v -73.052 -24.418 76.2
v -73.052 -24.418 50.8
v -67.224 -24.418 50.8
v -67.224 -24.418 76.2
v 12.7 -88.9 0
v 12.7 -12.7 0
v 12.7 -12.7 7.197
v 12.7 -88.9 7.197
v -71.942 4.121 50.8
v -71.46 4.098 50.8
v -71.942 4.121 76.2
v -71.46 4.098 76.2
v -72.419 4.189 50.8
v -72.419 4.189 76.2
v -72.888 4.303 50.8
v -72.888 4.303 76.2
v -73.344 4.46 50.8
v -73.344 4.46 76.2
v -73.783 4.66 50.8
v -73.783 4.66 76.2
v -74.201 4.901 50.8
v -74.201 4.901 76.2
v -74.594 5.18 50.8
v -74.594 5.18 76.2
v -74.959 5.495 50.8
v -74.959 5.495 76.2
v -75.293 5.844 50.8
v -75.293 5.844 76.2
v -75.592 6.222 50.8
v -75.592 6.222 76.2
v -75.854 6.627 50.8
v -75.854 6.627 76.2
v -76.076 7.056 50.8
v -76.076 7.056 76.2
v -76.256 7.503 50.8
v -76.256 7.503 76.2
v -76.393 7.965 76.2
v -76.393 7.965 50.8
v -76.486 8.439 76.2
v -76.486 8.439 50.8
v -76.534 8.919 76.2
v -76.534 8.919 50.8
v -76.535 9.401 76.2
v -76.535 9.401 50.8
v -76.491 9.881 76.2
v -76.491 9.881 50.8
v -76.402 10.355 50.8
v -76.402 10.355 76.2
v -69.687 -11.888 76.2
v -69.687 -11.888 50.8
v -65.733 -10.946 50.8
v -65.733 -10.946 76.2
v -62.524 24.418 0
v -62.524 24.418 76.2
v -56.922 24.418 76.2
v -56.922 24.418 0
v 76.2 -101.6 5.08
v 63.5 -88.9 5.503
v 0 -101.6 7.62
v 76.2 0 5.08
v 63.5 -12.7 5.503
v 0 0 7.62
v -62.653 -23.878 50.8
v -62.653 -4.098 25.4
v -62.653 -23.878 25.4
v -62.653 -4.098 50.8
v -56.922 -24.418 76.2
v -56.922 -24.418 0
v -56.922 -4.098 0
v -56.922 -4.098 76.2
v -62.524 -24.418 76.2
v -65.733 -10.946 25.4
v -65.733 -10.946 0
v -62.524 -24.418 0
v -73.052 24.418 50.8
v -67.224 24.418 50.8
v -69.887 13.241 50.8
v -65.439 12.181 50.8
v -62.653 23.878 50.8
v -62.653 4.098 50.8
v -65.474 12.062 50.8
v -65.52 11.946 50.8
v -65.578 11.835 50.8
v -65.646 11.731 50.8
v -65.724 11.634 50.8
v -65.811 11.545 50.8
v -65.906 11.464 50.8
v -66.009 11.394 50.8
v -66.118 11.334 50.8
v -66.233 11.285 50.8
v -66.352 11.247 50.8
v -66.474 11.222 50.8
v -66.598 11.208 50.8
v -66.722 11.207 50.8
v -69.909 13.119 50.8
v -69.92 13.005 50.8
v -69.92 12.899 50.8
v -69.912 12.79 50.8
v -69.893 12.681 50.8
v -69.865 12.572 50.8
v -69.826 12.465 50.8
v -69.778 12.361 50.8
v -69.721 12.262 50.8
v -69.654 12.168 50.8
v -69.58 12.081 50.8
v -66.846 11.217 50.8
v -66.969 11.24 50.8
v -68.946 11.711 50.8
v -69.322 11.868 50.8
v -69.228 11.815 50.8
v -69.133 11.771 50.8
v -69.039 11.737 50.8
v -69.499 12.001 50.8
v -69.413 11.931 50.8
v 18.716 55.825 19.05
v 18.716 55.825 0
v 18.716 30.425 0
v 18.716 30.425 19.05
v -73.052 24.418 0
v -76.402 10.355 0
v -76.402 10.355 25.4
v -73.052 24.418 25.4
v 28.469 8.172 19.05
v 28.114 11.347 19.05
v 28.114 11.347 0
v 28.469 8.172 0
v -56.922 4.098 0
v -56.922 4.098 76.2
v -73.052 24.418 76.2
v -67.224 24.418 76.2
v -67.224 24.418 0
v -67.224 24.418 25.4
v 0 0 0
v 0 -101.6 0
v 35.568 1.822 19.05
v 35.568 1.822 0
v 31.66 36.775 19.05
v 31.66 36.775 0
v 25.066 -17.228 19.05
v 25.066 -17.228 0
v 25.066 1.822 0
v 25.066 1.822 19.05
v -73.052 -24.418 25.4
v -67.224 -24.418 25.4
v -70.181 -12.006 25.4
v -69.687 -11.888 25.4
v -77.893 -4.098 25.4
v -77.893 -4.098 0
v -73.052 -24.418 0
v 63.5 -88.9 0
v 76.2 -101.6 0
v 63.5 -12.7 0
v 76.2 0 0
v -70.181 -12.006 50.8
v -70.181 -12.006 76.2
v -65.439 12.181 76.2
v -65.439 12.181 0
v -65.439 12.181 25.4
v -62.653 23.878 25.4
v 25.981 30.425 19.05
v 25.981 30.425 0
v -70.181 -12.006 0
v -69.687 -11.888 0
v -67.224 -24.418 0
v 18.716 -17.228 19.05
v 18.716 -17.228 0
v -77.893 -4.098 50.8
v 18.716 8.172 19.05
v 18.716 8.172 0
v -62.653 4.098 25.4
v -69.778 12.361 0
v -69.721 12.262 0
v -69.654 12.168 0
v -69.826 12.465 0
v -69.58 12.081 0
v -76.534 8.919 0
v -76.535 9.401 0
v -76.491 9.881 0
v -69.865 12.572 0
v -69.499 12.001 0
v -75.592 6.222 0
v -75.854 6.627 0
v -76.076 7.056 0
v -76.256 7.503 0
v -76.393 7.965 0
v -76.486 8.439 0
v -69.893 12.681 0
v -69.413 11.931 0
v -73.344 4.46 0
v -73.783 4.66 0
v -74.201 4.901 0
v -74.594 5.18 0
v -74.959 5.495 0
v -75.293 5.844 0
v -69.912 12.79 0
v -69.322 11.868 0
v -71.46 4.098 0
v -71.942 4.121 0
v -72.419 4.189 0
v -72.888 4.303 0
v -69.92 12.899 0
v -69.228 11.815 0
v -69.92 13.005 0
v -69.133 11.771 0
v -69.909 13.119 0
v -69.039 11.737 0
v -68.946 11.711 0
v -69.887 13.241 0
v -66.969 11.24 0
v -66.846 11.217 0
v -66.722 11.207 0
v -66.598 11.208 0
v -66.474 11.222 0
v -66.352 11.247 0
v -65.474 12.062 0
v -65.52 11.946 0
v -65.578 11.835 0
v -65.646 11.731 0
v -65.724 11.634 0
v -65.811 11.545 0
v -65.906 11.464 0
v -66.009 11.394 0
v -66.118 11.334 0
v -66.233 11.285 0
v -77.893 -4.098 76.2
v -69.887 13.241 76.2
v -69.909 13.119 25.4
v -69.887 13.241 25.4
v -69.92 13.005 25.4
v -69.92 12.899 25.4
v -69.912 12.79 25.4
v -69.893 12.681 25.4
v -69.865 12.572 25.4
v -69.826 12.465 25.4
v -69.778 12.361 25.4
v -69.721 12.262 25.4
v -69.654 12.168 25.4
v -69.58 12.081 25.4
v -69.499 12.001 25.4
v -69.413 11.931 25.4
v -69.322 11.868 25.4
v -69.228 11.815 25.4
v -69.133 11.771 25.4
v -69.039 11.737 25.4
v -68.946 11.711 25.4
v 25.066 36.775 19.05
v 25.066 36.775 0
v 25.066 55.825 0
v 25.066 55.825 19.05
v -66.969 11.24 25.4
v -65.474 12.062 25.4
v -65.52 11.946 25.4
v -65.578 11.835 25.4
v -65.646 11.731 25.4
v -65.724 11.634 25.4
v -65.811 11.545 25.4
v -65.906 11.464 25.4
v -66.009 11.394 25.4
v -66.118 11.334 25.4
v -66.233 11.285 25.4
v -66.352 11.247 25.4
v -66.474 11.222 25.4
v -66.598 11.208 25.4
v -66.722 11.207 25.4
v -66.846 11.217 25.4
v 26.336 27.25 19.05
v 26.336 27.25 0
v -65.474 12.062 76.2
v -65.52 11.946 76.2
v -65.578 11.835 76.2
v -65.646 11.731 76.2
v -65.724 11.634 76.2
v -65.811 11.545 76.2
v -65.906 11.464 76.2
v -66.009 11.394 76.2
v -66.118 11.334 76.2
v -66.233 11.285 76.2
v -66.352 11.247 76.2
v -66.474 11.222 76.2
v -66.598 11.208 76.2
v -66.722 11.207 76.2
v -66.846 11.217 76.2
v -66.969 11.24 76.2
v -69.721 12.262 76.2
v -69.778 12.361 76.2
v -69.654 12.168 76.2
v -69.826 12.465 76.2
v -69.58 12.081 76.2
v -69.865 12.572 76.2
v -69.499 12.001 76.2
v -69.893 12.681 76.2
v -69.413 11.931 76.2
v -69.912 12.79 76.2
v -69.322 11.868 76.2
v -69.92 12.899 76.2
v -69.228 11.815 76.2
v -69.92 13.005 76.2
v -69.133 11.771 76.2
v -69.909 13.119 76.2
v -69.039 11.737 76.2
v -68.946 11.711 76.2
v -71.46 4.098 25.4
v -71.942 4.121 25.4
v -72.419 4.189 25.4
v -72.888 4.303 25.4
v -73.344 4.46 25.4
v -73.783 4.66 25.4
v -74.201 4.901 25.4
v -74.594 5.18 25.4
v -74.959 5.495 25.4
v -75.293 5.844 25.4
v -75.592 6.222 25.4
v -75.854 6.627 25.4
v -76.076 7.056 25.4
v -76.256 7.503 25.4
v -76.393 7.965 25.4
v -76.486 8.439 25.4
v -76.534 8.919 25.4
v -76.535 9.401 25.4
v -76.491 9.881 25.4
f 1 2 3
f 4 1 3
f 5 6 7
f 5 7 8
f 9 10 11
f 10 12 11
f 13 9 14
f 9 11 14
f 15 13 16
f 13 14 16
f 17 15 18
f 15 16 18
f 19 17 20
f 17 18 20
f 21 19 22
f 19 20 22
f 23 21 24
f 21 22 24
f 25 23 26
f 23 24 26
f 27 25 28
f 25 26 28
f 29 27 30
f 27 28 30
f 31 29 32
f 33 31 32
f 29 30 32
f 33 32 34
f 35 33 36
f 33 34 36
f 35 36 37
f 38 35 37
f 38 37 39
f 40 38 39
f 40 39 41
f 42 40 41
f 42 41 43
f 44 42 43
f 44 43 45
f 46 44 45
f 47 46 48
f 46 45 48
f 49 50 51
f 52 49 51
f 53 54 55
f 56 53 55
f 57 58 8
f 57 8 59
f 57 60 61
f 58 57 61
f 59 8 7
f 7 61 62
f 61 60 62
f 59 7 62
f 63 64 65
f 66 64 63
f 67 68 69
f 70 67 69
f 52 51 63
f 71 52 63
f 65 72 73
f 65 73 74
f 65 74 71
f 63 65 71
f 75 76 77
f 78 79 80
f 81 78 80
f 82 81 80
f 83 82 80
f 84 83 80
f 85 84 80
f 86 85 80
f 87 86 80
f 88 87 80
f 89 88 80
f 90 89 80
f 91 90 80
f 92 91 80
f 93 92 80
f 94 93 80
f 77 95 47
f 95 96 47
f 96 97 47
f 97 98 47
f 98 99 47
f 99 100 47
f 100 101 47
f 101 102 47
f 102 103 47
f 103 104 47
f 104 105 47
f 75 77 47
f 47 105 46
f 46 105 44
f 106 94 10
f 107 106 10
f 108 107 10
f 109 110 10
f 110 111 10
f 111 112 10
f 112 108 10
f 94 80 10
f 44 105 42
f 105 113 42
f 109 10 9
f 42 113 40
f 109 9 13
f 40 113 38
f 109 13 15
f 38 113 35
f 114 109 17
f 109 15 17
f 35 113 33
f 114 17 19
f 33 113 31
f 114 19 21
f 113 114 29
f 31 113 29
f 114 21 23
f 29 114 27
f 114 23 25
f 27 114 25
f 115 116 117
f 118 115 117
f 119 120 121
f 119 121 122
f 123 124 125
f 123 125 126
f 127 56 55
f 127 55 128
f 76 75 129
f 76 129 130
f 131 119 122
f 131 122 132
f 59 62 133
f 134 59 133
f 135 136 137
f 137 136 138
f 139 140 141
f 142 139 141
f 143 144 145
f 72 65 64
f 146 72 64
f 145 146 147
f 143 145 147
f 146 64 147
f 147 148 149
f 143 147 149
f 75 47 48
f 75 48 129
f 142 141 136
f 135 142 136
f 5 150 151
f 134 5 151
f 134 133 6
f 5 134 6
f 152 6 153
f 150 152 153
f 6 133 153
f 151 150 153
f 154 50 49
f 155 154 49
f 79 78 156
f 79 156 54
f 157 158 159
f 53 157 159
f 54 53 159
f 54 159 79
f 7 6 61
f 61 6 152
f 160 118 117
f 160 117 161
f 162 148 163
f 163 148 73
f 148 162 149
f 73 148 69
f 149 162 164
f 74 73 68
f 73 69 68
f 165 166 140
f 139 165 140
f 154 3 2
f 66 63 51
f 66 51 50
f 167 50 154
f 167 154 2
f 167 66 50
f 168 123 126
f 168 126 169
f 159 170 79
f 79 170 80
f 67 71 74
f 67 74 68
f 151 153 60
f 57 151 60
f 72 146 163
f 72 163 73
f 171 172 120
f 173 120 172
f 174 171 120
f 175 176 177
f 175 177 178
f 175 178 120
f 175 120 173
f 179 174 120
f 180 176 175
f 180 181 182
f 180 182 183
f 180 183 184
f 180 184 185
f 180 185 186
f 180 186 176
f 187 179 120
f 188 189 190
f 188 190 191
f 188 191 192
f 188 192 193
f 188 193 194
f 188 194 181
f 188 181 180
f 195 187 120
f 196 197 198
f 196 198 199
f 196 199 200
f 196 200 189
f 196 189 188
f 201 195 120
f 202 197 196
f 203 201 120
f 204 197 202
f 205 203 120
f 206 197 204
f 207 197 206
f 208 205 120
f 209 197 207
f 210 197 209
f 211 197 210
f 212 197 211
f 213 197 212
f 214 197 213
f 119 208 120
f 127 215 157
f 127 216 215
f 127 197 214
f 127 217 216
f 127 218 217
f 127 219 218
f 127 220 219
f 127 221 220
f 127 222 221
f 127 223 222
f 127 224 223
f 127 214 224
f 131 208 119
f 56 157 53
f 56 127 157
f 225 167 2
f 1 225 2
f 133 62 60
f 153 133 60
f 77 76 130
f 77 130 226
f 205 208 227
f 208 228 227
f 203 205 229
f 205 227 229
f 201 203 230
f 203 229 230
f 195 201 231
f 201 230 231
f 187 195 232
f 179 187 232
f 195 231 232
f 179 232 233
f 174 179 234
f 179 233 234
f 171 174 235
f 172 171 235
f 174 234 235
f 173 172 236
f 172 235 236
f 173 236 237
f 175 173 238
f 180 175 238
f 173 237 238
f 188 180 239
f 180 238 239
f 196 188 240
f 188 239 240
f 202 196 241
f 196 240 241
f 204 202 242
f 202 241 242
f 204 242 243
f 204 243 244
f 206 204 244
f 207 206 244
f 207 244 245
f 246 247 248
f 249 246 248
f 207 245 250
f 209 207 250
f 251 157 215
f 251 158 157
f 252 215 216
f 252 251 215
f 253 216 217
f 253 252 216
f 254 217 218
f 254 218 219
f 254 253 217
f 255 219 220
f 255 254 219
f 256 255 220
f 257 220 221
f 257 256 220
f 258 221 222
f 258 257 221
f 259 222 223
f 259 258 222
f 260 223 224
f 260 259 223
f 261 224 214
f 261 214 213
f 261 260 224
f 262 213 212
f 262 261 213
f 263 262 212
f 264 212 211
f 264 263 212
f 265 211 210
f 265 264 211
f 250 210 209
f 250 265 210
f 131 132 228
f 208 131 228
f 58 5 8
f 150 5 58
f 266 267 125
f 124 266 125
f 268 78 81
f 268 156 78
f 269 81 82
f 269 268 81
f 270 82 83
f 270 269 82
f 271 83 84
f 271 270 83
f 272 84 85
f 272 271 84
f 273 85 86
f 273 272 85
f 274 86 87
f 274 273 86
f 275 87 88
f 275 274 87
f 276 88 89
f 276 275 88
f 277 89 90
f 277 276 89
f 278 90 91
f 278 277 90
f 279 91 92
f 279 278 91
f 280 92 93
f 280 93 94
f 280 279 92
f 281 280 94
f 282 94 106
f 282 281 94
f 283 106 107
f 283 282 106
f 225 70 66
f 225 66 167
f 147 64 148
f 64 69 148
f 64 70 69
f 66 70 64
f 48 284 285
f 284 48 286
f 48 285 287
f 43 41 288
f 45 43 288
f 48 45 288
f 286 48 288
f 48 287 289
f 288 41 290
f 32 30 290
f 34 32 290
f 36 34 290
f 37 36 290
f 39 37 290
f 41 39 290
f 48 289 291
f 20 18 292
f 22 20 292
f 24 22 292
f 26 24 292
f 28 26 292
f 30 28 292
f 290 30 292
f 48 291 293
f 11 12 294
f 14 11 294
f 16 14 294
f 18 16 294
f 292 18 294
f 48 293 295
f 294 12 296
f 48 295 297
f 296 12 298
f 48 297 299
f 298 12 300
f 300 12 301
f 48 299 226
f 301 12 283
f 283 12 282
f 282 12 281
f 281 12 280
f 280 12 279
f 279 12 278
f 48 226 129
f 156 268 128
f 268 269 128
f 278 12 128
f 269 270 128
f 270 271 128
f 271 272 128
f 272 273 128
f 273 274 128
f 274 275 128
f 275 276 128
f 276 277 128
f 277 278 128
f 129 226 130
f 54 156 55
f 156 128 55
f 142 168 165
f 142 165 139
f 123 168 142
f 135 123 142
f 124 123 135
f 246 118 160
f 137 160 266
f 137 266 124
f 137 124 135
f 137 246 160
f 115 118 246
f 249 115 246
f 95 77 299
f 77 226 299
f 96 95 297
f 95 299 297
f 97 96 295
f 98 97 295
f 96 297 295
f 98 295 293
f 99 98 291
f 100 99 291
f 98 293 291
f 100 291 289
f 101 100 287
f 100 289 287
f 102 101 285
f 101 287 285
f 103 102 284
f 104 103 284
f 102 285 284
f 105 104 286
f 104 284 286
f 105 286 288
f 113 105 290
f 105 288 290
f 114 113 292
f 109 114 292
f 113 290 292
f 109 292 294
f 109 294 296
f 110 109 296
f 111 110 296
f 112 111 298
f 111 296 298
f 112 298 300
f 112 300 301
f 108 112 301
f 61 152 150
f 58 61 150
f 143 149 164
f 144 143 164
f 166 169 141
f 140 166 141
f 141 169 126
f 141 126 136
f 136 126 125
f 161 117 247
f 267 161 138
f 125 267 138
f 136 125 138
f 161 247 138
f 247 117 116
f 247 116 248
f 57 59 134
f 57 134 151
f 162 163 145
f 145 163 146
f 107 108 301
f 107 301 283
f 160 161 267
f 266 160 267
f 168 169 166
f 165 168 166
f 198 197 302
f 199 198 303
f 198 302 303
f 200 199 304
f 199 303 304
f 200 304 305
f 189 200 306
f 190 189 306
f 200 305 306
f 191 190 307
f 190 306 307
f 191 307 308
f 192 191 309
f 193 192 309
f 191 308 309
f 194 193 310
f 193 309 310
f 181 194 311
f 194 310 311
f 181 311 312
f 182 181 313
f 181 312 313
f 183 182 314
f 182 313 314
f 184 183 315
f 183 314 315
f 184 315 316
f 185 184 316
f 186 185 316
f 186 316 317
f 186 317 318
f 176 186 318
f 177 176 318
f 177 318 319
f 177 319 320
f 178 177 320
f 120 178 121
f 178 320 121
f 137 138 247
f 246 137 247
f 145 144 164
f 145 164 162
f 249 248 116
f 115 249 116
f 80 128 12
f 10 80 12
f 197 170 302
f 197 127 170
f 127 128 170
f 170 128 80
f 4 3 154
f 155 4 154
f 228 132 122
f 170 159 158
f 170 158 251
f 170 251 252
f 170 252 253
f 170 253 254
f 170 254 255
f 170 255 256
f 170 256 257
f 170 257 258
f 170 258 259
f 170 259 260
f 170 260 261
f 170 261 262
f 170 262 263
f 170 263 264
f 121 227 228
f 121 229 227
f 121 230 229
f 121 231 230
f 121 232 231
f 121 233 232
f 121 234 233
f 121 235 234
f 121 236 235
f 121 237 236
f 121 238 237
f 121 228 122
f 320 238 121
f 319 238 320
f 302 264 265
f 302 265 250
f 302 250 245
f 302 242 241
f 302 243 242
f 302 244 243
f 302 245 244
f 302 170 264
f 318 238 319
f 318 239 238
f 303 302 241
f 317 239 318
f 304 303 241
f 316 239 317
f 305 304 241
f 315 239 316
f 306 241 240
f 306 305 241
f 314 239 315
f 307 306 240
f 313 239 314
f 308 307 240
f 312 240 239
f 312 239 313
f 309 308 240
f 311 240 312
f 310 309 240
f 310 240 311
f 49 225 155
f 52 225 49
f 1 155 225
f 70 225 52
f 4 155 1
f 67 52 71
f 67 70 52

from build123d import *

# Parameters (mm, degrees)
F1_DEPTH  = 101.6
F2_W      = 50.8
F2_H      = 76.2
F3_DEPTH  = 7.621
F5_DEPTH  = 19.05
F7_DEPTH  = 76.2
F9_DEPTH  = 0.508
F10_DEPTH = 0.508
F12_DEPTH = 76.201
F8_W      = 15.24
F8_H      = 25.4
F13_DEPTH = 97.503062818
F15_R     = 5.08
F16_R     = 1.27


with BuildPart() as f1:
    # F0 (on Front) → F1 (new body)
    with BuildSketch(Plane.XZ):
        Polygon((0, 7.62), (0, 0), (76.2, 0), (76.2, 5.08), align=None)
    extrude(amount=F1_DEPTH)

    # F2 (on face) → F3 (cut, through all)
    with BuildSketch(Plane(origin=(0, 0, 0), x_dir=(1, 0, 0), z_dir=(0, 0, -1))):
        with Locations((38.1, 50.8)):
            Rectangle(F2_W, F2_H)
    extrude(amount=-F3_DEPTH, mode=Mode.SUBTRACT)


with BuildPart() as f5:
    # F4 (on Top) → F5 (new body)
    with BuildSketch(Plane.XY):
        Polygon((25.0658135089, 55.8246009568), (18.7158135089, 55.8246009568), (18.7158135089, 30.4246009568), (25.9808377175, 30.4246009568), (26.3358135089, 27.2496009568), (28.1138135089, 11.3466855008), (28.4687893003, 8.1716855008), (18.7158135089, 8.1716855008), (18.7158135089, -17.2283144992), (25.0658135089, -17.2283144992), (25.0658135089, 1.8216855008), (35.5683051289, 1.8216855008), (31.6604503803, 36.7746009568), (25.0658135089, 36.7746009568), align=None)
    extrude(amount=F5_DEPTH)


with BuildPart() as f7:
    # F6 (on Top) → F7 (new body)
    with BuildSketch(Plane.XY):
        Polygon((-62.001723196, -24.417937182), (-56.921723196, -24.417937182), (-56.921723196, -4.097937182), (-77.8925820998, -4.097937182), (-73.0516752635, -24.417937182), (-66.7016752635, -24.417937182), (-69.686772723, -11.8878095782), (-65.2392414078, -10.8282581634), align=None)
    extrude(amount=F7_DEPTH)

    # F9 (add): a face of the model
    f9_faces = [f7.faces().sort_by_distance(p)[0] for p in [
        (-63.6204823019, -17.6230976727, 38.1),
    ]]
    extrude(f9_faces, amount=F9_DEPTH)

    # F10 (cut): a face of the model
    f10_faces = [f7.faces().sort_by_distance(p)[0] for p in [
        (-68.1942239932, -18.1528733801, 38.1),
    ]]
    extrude(f10_faces, amount=-F10_DEPTH, mode=Mode.SUBTRACT)

    # F11 (on face) → F12 (cut, through all)
    with BuildSketch(Plane(origin=(0, 0, 0), x_dir=(1, 0, 0), z_dir=(0, 0, -1))):
        Polygon((-62.5239400924, 24.417937182), (-62.001723196, 24.417937182), (-62.4958933421, 24.5356651169), align=None)
        Polygon((-63.2905851658, 24.417937182), (-62.5239400924, 24.417937182), (-62.4958933421, 24.5356651169), align=None)
    extrude(amount=-F12_DEPTH, mode=Mode.SUBTRACT)

    # F8 (on face) → F13 (cut, through all)
    with BuildSketch(Plane(origin=(0, -4.097937182, 0), x_dir=(-1, 0, 0), z_dir=(0, 1, 0))):
        with Locations((70.2725820998, 38.1)):
            Rectangle(F8_W, F8_H)
    extrude(amount=-F13_DEPTH, mode=Mode.SUBTRACT)


with BuildPart() as f14_1:
    # F14: instance of F7
    add(f7.part.mirror(Plane.XZ))

    # F15
    f15_edges = [f14_1.edges().sort_by_distance(p)[0] for p in [
        (-77.892582, 4.097937, 12.7),
        (-77.892582, 4.097937, 63.5),
    ]]
    fillet(f15_edges, radius=F15_R)

    # F16
    f16_edges = [f14_1.edges().sort_by_distance(p)[0] for p in [
        (-65.733412, 10.945986, 63.5),
        (-65.733412, 10.945986, 12.7),
        (-70.180943, 12.005538, 12.7),
        (-70.180943, 12.005538, 63.5),
    ]]
    fillet(f16_edges, radius=F16_R)


solid = Compound([f1.part, f5.part, f7.part, f14_1.part])
